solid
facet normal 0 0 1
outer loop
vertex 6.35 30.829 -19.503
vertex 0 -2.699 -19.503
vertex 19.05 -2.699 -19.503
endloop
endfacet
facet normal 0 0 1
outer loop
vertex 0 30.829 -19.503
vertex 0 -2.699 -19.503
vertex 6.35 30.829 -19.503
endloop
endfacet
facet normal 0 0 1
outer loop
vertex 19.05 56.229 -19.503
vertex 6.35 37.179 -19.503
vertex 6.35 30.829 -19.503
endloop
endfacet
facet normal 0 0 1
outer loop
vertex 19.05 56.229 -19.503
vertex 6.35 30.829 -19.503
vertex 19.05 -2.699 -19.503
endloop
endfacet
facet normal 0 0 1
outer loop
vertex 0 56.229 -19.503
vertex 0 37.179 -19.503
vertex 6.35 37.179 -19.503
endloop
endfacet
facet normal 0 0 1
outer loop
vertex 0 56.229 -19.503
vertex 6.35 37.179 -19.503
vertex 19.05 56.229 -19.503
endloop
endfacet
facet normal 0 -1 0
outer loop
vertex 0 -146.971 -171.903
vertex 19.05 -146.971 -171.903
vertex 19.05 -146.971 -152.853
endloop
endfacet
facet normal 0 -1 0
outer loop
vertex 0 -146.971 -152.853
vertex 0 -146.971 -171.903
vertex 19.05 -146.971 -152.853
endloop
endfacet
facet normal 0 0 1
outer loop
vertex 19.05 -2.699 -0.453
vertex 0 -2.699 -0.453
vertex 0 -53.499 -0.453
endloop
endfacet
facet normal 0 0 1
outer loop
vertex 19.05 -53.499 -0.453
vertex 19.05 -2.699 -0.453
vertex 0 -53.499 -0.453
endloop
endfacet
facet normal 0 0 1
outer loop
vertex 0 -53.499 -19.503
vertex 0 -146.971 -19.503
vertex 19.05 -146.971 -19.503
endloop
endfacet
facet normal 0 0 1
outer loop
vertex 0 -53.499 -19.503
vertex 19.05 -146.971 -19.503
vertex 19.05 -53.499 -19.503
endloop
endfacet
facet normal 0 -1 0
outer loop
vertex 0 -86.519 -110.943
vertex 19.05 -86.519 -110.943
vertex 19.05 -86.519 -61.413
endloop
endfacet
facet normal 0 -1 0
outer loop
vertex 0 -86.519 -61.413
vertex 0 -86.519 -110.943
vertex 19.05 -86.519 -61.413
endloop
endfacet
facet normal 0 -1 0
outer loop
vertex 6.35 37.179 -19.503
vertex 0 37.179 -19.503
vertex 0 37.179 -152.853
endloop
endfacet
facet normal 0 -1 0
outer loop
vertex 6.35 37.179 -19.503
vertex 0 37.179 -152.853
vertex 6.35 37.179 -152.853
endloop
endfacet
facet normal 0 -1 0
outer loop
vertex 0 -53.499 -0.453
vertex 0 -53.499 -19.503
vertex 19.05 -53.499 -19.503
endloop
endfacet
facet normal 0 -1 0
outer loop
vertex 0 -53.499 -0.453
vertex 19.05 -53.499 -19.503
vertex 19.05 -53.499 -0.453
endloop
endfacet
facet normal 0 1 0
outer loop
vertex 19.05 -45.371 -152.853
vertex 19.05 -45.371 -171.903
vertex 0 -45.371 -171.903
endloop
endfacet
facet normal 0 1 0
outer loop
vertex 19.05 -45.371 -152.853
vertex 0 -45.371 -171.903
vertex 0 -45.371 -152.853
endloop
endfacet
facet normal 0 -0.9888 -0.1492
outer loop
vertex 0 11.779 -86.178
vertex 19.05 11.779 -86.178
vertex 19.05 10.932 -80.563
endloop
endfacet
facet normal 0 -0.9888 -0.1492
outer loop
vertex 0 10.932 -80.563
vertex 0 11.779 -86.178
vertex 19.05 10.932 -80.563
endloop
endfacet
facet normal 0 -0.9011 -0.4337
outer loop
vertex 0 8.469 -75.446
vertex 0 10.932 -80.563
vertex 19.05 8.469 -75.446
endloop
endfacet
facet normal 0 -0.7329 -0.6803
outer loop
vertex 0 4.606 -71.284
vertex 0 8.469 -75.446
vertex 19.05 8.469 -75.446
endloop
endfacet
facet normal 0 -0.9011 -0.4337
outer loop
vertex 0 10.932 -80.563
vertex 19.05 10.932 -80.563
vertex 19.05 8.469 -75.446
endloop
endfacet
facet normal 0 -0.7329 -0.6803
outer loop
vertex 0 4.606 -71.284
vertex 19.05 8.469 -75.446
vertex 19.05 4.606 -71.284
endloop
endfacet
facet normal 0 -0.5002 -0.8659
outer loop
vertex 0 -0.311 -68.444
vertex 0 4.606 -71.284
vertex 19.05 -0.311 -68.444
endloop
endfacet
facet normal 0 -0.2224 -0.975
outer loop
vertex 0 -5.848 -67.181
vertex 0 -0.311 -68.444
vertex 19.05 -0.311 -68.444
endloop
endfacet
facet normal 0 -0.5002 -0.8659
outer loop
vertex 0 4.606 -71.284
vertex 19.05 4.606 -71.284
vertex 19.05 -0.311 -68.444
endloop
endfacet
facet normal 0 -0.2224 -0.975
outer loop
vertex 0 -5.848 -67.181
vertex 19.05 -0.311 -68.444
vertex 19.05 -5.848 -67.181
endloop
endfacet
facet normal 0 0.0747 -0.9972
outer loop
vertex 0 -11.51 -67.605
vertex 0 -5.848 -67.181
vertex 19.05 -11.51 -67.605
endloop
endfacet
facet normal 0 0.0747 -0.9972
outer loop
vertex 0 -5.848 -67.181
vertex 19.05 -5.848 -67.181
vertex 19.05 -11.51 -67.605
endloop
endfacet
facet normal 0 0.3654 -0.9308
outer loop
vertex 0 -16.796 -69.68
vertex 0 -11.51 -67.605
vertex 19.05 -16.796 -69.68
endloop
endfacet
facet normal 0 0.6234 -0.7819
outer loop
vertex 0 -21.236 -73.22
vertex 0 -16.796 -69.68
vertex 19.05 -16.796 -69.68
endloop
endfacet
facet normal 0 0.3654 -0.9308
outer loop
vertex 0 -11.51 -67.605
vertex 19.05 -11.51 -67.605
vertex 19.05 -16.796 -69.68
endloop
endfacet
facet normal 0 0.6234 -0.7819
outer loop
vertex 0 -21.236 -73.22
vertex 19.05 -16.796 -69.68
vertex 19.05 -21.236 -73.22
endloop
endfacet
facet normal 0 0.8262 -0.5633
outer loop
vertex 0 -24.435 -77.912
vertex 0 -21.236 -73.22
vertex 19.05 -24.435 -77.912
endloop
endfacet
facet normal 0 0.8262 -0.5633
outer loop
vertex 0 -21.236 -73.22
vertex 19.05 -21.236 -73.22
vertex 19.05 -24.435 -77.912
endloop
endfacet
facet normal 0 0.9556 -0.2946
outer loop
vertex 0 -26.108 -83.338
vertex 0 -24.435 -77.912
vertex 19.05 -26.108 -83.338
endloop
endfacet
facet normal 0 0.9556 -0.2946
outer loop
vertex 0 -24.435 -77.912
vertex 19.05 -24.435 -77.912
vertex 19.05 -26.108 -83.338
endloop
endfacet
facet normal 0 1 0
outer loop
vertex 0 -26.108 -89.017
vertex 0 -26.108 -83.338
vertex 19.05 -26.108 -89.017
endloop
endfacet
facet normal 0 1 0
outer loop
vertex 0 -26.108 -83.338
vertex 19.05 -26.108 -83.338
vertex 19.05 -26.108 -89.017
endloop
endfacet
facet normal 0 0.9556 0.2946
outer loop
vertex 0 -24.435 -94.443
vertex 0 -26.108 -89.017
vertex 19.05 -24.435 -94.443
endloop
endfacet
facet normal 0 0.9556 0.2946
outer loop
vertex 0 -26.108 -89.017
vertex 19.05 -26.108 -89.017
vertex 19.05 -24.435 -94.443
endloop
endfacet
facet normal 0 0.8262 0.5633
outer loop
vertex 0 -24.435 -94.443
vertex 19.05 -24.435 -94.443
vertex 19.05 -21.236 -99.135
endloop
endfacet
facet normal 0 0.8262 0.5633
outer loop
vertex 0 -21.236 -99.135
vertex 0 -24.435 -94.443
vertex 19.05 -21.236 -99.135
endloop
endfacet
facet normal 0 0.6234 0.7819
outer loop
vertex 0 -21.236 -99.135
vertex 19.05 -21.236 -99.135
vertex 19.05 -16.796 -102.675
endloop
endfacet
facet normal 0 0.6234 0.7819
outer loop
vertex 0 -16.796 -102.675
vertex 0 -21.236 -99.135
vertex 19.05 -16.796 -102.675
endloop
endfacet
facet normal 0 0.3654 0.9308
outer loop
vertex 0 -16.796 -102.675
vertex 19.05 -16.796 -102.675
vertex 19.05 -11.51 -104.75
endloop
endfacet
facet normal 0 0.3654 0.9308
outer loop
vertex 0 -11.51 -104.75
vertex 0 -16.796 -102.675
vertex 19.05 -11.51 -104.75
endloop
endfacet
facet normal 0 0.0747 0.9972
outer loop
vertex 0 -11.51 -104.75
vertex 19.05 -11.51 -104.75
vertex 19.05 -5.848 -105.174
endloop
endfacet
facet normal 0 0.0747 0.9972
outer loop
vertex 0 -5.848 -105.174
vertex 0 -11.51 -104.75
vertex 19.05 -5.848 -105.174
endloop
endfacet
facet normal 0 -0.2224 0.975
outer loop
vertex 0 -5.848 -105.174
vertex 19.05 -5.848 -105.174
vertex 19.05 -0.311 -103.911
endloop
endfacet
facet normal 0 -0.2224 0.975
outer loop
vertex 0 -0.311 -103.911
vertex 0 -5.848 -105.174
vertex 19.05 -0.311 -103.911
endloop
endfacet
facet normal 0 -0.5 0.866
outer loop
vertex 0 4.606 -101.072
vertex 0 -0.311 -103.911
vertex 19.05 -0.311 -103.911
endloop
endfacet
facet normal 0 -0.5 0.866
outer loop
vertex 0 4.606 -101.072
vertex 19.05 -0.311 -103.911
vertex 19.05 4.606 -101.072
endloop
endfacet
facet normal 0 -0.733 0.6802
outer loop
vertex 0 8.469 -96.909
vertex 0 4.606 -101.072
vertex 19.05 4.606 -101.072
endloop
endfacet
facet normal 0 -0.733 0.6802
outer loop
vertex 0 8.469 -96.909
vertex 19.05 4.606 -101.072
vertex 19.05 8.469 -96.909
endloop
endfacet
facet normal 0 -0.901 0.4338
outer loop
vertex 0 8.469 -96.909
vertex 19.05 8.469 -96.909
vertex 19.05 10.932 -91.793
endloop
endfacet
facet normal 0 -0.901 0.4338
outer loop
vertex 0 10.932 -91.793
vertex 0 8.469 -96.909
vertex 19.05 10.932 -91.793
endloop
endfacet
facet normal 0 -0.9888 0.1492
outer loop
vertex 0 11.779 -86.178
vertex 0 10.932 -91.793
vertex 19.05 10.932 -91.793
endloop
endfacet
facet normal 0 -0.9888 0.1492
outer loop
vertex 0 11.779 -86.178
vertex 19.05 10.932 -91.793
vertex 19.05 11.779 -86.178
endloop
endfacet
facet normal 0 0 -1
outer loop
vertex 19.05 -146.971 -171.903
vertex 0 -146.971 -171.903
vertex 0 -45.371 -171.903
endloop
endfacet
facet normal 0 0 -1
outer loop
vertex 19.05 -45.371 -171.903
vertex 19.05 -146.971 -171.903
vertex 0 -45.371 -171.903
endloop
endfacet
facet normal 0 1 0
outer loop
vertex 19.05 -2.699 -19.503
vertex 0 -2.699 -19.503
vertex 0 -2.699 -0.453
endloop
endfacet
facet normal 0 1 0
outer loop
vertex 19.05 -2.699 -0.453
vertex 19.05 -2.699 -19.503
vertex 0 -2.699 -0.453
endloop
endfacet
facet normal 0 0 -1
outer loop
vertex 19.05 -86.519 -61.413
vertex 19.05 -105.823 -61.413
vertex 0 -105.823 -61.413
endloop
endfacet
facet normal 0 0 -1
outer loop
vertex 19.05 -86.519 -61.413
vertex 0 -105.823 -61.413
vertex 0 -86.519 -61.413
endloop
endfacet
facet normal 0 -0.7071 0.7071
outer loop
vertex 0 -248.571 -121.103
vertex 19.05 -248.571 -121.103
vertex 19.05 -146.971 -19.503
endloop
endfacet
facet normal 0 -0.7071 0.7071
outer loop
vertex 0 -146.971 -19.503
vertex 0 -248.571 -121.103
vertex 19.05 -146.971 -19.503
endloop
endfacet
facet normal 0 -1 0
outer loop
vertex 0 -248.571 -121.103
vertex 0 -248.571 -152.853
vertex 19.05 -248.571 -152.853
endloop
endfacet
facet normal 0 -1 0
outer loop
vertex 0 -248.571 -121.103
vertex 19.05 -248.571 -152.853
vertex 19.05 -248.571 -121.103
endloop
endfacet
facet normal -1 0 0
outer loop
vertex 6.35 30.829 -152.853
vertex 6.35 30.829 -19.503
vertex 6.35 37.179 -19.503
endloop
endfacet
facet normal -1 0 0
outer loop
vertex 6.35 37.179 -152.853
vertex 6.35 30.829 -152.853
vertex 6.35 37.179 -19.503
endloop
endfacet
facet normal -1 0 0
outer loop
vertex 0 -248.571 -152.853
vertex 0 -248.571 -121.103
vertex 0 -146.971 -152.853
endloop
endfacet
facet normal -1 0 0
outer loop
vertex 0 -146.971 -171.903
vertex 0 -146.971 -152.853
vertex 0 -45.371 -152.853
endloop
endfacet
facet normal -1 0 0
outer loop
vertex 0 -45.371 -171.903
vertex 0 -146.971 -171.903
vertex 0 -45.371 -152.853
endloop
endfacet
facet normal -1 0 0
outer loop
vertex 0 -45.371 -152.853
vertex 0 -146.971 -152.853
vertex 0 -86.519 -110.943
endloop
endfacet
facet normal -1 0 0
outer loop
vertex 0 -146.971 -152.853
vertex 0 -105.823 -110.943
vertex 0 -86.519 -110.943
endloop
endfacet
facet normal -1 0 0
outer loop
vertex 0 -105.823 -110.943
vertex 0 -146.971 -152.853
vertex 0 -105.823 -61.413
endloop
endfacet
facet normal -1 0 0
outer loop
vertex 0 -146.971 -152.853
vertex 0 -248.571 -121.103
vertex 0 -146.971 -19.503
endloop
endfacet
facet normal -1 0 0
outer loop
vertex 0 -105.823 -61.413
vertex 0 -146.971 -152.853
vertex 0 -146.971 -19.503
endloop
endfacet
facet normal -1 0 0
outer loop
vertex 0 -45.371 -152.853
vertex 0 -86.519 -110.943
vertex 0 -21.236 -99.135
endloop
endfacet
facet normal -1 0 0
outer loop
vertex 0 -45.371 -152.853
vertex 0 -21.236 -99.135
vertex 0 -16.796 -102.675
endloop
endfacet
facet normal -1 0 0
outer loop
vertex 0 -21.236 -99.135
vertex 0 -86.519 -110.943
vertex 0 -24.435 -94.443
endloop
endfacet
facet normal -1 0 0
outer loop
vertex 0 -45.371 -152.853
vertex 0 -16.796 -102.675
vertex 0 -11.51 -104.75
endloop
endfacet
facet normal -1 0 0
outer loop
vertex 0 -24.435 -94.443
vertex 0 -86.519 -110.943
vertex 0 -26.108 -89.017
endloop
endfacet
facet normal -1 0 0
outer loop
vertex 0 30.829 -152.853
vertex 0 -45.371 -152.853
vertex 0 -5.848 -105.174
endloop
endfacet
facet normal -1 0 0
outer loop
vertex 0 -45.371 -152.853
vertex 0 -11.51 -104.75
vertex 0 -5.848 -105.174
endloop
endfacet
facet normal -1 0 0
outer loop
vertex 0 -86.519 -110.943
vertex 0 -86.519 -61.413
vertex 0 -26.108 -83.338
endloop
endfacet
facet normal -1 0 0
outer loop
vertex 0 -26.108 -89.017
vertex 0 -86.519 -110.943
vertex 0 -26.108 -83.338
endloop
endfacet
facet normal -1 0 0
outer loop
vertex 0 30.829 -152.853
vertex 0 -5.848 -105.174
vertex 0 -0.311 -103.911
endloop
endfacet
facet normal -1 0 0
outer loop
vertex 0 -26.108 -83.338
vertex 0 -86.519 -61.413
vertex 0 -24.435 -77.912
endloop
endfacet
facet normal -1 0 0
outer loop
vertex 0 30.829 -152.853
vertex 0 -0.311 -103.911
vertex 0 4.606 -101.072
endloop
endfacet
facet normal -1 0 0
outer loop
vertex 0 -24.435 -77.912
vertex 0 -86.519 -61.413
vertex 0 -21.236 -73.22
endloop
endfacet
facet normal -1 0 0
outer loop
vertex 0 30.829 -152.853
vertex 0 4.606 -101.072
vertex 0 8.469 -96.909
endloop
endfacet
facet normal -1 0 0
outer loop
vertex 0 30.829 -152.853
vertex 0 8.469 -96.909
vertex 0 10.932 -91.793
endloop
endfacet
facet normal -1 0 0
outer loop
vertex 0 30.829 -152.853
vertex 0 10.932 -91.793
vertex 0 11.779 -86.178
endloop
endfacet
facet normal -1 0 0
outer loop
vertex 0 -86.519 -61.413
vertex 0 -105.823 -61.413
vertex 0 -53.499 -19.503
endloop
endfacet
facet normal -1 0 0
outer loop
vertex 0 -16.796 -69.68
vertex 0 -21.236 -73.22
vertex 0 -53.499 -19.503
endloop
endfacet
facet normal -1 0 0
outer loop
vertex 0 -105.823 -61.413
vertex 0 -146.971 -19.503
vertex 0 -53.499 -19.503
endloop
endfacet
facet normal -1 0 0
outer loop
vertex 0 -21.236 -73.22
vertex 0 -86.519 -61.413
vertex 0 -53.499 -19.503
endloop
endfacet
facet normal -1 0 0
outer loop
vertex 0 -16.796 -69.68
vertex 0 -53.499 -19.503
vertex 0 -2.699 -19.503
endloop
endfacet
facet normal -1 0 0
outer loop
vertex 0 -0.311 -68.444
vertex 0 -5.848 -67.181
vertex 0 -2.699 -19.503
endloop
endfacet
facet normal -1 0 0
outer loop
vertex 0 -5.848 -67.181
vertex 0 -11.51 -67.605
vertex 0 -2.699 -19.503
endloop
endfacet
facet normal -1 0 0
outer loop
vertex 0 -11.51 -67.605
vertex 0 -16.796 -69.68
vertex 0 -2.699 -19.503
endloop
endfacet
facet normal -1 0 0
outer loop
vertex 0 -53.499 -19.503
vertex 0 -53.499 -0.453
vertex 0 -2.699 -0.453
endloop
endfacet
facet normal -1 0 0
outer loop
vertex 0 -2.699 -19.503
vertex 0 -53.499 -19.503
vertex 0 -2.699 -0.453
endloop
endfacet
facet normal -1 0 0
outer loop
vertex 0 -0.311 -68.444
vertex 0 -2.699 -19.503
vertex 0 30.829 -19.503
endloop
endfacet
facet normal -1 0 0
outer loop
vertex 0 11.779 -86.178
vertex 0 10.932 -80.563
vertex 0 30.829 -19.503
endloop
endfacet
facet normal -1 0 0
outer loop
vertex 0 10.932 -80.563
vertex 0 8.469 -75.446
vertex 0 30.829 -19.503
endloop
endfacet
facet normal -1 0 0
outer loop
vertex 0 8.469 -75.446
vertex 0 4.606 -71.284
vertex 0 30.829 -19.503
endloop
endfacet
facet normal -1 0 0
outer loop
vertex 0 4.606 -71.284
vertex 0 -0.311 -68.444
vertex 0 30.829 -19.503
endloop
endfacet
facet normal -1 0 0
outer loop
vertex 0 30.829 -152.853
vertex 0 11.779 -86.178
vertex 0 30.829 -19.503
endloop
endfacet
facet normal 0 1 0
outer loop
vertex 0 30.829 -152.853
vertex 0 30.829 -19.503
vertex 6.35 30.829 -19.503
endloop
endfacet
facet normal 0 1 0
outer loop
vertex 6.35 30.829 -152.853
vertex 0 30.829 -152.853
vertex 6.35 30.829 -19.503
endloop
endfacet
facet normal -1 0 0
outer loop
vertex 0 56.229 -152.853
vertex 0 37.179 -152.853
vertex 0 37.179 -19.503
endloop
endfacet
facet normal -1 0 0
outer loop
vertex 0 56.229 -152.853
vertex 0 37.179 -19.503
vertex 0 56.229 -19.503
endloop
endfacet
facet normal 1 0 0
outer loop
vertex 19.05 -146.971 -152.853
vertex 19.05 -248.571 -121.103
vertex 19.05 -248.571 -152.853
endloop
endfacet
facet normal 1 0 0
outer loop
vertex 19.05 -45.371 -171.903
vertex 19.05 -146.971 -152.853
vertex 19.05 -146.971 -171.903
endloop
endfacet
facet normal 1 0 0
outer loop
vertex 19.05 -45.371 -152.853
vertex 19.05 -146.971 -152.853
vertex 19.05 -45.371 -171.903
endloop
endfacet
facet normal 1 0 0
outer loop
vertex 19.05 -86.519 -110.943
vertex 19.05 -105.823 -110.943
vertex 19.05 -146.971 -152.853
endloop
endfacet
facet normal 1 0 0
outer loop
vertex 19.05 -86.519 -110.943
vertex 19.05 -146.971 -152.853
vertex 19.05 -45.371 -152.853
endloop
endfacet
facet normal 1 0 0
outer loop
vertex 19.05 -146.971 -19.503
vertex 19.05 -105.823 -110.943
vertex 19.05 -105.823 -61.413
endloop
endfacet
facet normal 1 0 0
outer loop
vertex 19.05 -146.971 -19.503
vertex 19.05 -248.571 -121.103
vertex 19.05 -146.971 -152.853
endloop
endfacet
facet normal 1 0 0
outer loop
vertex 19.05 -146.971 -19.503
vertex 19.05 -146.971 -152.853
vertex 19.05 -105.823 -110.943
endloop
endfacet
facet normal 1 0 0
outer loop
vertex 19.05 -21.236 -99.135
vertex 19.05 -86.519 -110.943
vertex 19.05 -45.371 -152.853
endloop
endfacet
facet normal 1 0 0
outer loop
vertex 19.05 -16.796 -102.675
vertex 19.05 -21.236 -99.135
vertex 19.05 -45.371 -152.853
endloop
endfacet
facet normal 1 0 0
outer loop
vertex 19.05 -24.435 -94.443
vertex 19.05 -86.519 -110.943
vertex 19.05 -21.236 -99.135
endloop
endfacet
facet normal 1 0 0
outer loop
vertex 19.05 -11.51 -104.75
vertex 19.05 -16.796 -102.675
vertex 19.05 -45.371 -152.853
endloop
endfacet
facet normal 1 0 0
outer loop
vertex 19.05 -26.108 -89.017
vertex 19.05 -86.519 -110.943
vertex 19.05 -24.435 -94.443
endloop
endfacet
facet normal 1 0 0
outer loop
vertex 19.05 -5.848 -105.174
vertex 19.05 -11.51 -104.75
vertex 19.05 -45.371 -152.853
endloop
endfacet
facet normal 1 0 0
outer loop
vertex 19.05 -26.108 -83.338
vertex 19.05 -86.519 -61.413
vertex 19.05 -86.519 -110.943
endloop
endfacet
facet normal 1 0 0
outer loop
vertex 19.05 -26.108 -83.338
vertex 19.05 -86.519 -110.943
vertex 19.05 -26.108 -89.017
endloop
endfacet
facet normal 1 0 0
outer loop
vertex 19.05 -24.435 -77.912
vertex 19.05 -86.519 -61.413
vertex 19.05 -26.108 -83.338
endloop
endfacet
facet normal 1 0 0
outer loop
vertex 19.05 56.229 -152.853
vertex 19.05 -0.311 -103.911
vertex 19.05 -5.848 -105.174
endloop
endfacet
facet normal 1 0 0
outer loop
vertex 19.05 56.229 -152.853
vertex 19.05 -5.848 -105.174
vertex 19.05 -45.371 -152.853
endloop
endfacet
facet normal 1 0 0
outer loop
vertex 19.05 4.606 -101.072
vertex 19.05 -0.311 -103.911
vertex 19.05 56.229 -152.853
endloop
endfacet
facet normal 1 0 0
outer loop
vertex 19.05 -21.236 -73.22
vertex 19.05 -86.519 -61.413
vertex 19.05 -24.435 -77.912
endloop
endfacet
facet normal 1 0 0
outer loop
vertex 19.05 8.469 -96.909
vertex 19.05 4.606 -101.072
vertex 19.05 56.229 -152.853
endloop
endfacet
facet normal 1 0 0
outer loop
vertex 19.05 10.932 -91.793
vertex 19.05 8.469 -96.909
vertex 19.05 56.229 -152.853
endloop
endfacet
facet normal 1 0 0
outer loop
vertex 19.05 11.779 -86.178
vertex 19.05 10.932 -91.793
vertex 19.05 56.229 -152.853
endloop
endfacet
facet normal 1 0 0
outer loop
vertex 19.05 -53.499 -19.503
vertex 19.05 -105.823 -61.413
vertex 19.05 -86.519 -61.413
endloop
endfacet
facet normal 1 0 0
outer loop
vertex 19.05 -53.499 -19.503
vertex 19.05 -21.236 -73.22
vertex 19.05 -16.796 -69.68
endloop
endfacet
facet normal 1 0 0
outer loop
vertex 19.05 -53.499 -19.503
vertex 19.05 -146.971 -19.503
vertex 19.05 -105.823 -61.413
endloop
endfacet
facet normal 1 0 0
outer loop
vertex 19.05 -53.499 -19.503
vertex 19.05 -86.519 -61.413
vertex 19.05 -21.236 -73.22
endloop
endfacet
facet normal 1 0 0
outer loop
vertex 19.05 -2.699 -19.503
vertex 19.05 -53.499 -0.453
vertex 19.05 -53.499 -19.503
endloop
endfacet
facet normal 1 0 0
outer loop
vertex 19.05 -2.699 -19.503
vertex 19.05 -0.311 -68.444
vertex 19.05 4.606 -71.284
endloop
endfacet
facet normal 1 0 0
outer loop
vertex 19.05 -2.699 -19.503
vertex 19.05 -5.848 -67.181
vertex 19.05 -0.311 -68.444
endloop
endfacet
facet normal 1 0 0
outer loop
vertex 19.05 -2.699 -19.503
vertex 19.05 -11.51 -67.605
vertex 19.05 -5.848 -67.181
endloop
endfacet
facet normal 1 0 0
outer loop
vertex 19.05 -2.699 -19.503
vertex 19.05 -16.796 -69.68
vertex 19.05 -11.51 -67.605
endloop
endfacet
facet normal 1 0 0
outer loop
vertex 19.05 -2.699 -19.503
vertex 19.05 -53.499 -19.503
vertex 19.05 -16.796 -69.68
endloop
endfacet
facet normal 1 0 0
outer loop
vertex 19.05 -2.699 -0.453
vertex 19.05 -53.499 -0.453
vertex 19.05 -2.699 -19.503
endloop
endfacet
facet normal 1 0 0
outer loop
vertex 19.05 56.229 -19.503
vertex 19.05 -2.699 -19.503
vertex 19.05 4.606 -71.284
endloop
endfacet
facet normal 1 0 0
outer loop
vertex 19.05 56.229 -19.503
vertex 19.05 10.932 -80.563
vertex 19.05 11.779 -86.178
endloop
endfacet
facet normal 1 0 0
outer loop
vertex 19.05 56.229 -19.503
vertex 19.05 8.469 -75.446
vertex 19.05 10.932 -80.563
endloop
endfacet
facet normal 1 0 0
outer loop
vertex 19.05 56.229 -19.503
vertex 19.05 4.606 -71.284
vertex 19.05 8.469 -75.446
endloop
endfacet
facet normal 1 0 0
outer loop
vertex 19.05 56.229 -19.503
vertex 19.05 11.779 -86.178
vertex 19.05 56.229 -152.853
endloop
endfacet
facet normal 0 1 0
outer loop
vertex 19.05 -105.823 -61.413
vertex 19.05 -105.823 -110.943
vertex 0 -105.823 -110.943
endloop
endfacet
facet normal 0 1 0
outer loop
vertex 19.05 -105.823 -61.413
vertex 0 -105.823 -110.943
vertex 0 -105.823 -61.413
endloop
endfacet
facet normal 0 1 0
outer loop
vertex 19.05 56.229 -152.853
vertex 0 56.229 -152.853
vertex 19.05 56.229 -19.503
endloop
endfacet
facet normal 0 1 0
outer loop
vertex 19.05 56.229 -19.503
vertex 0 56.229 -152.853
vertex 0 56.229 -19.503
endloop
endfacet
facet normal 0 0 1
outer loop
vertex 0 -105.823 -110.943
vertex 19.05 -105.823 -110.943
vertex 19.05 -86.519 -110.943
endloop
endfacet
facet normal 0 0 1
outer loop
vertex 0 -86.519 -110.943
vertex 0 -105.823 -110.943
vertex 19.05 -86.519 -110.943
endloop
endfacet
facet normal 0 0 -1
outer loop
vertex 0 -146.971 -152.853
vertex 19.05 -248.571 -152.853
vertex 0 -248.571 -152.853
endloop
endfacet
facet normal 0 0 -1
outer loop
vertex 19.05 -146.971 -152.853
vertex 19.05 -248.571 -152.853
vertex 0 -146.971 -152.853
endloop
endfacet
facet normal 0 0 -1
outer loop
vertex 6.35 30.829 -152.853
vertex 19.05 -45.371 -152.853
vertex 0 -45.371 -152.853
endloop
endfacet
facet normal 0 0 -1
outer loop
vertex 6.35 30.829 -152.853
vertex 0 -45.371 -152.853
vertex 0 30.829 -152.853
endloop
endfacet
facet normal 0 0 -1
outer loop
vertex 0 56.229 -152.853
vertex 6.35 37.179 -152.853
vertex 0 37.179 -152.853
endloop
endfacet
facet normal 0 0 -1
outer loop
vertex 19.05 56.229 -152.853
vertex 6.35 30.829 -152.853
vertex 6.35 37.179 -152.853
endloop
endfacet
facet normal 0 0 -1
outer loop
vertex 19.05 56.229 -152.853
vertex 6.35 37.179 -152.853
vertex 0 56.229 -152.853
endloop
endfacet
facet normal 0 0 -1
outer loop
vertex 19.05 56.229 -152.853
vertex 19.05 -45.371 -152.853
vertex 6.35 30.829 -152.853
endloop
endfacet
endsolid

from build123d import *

# Parameters (mm, degrees)
F0_W      = 304.8
F0_H      = 152.4
F1_DEPTH  = 19.05
F2_W      = 101.6
F2_H      = 19.05
F3_DEPTH  = 19.051
F4_W      = 19.304
F4_H      = 49.53
F5_DEPTH  = 19.051
F6_W      = 6.35
F6_H      = 6.35
F7_DEPTH  = 152.401
F9_DEPTH  = 19.051
F10_R     = 19.05
F11_DEPTH = 19.051
F12_W     = 50.8
F12_H     = 19.05
F13_DEPTH = 19.05


with BuildPart() as f1:
    # F0 (on Right) → F1 (new body)
    with BuildSketch(Plane.YZ):
        with Locations((-96.171215, -95.702616)):
            Rectangle(F0_W, F0_H)
    extrude(amount=F1_DEPTH)

    # F2 (on face) → F3 (cut, through all)
    with BuildSketch(Plane.YZ.offset(19.05)):
        with Locations((-197.771215, -162.377616)):
            Rectangle(F2_W, F2_H)
        with Locations((5.428785, -162.377616)):
            Rectangle(F2_W, F2_H)
    extrude(amount=-F3_DEPTH, mode=Mode.SUBTRACT)

    # F4 (on face) → F5 (cut, through all)
    with BuildSketch(Plane.YZ.offset(19.05)):
        with Locations((-96.171215, -86.177616)):
            Rectangle(F4_W, F4_H)
    extrude(amount=-F5_DEPTH, mode=Mode.SUBTRACT)

    # F6 (on face) → F7 (cut, through all)
    with BuildSketch(Plane.XY.offset(-19.502616)):
        with Locations((3.175, 34.003785)):
            Rectangle(F6_W, F6_H)
    extrude(amount=-F7_DEPTH, mode=Mode.SUBTRACT)

    # F8 (on face) → F9 (cut, through all)
    with BuildSketch(Plane.YZ.offset(19.05)):
        Polygon((-146.971215, -19.502616), (-248.571215, -19.502616), (-248.571215, -121.102616), align=None)
    extrude(amount=-F9_DEPTH, mode=Mode.SUBTRACT)

    # F10 (on face) → F11 (cut, through all)
    with BuildSketch(Plane.YZ.offset(19.05)):
        with Locations((-7.271215, -86.177616)):
            Circle(F10_R)
    extrude(amount=-F11_DEPTH, mode=Mode.SUBTRACT)

    # F12 (on face) → F13 (join)
    with BuildSketch(Plane(origin=(0, 0, 0), x_dir=(0, -1, 0), z_dir=(-1, 0, 0))):
        with Locations((28.099215, -9.977616)):
            Rectangle(F12_W, F12_H)
    extrude(amount=-F13_DEPTH)


solid = f1.part
